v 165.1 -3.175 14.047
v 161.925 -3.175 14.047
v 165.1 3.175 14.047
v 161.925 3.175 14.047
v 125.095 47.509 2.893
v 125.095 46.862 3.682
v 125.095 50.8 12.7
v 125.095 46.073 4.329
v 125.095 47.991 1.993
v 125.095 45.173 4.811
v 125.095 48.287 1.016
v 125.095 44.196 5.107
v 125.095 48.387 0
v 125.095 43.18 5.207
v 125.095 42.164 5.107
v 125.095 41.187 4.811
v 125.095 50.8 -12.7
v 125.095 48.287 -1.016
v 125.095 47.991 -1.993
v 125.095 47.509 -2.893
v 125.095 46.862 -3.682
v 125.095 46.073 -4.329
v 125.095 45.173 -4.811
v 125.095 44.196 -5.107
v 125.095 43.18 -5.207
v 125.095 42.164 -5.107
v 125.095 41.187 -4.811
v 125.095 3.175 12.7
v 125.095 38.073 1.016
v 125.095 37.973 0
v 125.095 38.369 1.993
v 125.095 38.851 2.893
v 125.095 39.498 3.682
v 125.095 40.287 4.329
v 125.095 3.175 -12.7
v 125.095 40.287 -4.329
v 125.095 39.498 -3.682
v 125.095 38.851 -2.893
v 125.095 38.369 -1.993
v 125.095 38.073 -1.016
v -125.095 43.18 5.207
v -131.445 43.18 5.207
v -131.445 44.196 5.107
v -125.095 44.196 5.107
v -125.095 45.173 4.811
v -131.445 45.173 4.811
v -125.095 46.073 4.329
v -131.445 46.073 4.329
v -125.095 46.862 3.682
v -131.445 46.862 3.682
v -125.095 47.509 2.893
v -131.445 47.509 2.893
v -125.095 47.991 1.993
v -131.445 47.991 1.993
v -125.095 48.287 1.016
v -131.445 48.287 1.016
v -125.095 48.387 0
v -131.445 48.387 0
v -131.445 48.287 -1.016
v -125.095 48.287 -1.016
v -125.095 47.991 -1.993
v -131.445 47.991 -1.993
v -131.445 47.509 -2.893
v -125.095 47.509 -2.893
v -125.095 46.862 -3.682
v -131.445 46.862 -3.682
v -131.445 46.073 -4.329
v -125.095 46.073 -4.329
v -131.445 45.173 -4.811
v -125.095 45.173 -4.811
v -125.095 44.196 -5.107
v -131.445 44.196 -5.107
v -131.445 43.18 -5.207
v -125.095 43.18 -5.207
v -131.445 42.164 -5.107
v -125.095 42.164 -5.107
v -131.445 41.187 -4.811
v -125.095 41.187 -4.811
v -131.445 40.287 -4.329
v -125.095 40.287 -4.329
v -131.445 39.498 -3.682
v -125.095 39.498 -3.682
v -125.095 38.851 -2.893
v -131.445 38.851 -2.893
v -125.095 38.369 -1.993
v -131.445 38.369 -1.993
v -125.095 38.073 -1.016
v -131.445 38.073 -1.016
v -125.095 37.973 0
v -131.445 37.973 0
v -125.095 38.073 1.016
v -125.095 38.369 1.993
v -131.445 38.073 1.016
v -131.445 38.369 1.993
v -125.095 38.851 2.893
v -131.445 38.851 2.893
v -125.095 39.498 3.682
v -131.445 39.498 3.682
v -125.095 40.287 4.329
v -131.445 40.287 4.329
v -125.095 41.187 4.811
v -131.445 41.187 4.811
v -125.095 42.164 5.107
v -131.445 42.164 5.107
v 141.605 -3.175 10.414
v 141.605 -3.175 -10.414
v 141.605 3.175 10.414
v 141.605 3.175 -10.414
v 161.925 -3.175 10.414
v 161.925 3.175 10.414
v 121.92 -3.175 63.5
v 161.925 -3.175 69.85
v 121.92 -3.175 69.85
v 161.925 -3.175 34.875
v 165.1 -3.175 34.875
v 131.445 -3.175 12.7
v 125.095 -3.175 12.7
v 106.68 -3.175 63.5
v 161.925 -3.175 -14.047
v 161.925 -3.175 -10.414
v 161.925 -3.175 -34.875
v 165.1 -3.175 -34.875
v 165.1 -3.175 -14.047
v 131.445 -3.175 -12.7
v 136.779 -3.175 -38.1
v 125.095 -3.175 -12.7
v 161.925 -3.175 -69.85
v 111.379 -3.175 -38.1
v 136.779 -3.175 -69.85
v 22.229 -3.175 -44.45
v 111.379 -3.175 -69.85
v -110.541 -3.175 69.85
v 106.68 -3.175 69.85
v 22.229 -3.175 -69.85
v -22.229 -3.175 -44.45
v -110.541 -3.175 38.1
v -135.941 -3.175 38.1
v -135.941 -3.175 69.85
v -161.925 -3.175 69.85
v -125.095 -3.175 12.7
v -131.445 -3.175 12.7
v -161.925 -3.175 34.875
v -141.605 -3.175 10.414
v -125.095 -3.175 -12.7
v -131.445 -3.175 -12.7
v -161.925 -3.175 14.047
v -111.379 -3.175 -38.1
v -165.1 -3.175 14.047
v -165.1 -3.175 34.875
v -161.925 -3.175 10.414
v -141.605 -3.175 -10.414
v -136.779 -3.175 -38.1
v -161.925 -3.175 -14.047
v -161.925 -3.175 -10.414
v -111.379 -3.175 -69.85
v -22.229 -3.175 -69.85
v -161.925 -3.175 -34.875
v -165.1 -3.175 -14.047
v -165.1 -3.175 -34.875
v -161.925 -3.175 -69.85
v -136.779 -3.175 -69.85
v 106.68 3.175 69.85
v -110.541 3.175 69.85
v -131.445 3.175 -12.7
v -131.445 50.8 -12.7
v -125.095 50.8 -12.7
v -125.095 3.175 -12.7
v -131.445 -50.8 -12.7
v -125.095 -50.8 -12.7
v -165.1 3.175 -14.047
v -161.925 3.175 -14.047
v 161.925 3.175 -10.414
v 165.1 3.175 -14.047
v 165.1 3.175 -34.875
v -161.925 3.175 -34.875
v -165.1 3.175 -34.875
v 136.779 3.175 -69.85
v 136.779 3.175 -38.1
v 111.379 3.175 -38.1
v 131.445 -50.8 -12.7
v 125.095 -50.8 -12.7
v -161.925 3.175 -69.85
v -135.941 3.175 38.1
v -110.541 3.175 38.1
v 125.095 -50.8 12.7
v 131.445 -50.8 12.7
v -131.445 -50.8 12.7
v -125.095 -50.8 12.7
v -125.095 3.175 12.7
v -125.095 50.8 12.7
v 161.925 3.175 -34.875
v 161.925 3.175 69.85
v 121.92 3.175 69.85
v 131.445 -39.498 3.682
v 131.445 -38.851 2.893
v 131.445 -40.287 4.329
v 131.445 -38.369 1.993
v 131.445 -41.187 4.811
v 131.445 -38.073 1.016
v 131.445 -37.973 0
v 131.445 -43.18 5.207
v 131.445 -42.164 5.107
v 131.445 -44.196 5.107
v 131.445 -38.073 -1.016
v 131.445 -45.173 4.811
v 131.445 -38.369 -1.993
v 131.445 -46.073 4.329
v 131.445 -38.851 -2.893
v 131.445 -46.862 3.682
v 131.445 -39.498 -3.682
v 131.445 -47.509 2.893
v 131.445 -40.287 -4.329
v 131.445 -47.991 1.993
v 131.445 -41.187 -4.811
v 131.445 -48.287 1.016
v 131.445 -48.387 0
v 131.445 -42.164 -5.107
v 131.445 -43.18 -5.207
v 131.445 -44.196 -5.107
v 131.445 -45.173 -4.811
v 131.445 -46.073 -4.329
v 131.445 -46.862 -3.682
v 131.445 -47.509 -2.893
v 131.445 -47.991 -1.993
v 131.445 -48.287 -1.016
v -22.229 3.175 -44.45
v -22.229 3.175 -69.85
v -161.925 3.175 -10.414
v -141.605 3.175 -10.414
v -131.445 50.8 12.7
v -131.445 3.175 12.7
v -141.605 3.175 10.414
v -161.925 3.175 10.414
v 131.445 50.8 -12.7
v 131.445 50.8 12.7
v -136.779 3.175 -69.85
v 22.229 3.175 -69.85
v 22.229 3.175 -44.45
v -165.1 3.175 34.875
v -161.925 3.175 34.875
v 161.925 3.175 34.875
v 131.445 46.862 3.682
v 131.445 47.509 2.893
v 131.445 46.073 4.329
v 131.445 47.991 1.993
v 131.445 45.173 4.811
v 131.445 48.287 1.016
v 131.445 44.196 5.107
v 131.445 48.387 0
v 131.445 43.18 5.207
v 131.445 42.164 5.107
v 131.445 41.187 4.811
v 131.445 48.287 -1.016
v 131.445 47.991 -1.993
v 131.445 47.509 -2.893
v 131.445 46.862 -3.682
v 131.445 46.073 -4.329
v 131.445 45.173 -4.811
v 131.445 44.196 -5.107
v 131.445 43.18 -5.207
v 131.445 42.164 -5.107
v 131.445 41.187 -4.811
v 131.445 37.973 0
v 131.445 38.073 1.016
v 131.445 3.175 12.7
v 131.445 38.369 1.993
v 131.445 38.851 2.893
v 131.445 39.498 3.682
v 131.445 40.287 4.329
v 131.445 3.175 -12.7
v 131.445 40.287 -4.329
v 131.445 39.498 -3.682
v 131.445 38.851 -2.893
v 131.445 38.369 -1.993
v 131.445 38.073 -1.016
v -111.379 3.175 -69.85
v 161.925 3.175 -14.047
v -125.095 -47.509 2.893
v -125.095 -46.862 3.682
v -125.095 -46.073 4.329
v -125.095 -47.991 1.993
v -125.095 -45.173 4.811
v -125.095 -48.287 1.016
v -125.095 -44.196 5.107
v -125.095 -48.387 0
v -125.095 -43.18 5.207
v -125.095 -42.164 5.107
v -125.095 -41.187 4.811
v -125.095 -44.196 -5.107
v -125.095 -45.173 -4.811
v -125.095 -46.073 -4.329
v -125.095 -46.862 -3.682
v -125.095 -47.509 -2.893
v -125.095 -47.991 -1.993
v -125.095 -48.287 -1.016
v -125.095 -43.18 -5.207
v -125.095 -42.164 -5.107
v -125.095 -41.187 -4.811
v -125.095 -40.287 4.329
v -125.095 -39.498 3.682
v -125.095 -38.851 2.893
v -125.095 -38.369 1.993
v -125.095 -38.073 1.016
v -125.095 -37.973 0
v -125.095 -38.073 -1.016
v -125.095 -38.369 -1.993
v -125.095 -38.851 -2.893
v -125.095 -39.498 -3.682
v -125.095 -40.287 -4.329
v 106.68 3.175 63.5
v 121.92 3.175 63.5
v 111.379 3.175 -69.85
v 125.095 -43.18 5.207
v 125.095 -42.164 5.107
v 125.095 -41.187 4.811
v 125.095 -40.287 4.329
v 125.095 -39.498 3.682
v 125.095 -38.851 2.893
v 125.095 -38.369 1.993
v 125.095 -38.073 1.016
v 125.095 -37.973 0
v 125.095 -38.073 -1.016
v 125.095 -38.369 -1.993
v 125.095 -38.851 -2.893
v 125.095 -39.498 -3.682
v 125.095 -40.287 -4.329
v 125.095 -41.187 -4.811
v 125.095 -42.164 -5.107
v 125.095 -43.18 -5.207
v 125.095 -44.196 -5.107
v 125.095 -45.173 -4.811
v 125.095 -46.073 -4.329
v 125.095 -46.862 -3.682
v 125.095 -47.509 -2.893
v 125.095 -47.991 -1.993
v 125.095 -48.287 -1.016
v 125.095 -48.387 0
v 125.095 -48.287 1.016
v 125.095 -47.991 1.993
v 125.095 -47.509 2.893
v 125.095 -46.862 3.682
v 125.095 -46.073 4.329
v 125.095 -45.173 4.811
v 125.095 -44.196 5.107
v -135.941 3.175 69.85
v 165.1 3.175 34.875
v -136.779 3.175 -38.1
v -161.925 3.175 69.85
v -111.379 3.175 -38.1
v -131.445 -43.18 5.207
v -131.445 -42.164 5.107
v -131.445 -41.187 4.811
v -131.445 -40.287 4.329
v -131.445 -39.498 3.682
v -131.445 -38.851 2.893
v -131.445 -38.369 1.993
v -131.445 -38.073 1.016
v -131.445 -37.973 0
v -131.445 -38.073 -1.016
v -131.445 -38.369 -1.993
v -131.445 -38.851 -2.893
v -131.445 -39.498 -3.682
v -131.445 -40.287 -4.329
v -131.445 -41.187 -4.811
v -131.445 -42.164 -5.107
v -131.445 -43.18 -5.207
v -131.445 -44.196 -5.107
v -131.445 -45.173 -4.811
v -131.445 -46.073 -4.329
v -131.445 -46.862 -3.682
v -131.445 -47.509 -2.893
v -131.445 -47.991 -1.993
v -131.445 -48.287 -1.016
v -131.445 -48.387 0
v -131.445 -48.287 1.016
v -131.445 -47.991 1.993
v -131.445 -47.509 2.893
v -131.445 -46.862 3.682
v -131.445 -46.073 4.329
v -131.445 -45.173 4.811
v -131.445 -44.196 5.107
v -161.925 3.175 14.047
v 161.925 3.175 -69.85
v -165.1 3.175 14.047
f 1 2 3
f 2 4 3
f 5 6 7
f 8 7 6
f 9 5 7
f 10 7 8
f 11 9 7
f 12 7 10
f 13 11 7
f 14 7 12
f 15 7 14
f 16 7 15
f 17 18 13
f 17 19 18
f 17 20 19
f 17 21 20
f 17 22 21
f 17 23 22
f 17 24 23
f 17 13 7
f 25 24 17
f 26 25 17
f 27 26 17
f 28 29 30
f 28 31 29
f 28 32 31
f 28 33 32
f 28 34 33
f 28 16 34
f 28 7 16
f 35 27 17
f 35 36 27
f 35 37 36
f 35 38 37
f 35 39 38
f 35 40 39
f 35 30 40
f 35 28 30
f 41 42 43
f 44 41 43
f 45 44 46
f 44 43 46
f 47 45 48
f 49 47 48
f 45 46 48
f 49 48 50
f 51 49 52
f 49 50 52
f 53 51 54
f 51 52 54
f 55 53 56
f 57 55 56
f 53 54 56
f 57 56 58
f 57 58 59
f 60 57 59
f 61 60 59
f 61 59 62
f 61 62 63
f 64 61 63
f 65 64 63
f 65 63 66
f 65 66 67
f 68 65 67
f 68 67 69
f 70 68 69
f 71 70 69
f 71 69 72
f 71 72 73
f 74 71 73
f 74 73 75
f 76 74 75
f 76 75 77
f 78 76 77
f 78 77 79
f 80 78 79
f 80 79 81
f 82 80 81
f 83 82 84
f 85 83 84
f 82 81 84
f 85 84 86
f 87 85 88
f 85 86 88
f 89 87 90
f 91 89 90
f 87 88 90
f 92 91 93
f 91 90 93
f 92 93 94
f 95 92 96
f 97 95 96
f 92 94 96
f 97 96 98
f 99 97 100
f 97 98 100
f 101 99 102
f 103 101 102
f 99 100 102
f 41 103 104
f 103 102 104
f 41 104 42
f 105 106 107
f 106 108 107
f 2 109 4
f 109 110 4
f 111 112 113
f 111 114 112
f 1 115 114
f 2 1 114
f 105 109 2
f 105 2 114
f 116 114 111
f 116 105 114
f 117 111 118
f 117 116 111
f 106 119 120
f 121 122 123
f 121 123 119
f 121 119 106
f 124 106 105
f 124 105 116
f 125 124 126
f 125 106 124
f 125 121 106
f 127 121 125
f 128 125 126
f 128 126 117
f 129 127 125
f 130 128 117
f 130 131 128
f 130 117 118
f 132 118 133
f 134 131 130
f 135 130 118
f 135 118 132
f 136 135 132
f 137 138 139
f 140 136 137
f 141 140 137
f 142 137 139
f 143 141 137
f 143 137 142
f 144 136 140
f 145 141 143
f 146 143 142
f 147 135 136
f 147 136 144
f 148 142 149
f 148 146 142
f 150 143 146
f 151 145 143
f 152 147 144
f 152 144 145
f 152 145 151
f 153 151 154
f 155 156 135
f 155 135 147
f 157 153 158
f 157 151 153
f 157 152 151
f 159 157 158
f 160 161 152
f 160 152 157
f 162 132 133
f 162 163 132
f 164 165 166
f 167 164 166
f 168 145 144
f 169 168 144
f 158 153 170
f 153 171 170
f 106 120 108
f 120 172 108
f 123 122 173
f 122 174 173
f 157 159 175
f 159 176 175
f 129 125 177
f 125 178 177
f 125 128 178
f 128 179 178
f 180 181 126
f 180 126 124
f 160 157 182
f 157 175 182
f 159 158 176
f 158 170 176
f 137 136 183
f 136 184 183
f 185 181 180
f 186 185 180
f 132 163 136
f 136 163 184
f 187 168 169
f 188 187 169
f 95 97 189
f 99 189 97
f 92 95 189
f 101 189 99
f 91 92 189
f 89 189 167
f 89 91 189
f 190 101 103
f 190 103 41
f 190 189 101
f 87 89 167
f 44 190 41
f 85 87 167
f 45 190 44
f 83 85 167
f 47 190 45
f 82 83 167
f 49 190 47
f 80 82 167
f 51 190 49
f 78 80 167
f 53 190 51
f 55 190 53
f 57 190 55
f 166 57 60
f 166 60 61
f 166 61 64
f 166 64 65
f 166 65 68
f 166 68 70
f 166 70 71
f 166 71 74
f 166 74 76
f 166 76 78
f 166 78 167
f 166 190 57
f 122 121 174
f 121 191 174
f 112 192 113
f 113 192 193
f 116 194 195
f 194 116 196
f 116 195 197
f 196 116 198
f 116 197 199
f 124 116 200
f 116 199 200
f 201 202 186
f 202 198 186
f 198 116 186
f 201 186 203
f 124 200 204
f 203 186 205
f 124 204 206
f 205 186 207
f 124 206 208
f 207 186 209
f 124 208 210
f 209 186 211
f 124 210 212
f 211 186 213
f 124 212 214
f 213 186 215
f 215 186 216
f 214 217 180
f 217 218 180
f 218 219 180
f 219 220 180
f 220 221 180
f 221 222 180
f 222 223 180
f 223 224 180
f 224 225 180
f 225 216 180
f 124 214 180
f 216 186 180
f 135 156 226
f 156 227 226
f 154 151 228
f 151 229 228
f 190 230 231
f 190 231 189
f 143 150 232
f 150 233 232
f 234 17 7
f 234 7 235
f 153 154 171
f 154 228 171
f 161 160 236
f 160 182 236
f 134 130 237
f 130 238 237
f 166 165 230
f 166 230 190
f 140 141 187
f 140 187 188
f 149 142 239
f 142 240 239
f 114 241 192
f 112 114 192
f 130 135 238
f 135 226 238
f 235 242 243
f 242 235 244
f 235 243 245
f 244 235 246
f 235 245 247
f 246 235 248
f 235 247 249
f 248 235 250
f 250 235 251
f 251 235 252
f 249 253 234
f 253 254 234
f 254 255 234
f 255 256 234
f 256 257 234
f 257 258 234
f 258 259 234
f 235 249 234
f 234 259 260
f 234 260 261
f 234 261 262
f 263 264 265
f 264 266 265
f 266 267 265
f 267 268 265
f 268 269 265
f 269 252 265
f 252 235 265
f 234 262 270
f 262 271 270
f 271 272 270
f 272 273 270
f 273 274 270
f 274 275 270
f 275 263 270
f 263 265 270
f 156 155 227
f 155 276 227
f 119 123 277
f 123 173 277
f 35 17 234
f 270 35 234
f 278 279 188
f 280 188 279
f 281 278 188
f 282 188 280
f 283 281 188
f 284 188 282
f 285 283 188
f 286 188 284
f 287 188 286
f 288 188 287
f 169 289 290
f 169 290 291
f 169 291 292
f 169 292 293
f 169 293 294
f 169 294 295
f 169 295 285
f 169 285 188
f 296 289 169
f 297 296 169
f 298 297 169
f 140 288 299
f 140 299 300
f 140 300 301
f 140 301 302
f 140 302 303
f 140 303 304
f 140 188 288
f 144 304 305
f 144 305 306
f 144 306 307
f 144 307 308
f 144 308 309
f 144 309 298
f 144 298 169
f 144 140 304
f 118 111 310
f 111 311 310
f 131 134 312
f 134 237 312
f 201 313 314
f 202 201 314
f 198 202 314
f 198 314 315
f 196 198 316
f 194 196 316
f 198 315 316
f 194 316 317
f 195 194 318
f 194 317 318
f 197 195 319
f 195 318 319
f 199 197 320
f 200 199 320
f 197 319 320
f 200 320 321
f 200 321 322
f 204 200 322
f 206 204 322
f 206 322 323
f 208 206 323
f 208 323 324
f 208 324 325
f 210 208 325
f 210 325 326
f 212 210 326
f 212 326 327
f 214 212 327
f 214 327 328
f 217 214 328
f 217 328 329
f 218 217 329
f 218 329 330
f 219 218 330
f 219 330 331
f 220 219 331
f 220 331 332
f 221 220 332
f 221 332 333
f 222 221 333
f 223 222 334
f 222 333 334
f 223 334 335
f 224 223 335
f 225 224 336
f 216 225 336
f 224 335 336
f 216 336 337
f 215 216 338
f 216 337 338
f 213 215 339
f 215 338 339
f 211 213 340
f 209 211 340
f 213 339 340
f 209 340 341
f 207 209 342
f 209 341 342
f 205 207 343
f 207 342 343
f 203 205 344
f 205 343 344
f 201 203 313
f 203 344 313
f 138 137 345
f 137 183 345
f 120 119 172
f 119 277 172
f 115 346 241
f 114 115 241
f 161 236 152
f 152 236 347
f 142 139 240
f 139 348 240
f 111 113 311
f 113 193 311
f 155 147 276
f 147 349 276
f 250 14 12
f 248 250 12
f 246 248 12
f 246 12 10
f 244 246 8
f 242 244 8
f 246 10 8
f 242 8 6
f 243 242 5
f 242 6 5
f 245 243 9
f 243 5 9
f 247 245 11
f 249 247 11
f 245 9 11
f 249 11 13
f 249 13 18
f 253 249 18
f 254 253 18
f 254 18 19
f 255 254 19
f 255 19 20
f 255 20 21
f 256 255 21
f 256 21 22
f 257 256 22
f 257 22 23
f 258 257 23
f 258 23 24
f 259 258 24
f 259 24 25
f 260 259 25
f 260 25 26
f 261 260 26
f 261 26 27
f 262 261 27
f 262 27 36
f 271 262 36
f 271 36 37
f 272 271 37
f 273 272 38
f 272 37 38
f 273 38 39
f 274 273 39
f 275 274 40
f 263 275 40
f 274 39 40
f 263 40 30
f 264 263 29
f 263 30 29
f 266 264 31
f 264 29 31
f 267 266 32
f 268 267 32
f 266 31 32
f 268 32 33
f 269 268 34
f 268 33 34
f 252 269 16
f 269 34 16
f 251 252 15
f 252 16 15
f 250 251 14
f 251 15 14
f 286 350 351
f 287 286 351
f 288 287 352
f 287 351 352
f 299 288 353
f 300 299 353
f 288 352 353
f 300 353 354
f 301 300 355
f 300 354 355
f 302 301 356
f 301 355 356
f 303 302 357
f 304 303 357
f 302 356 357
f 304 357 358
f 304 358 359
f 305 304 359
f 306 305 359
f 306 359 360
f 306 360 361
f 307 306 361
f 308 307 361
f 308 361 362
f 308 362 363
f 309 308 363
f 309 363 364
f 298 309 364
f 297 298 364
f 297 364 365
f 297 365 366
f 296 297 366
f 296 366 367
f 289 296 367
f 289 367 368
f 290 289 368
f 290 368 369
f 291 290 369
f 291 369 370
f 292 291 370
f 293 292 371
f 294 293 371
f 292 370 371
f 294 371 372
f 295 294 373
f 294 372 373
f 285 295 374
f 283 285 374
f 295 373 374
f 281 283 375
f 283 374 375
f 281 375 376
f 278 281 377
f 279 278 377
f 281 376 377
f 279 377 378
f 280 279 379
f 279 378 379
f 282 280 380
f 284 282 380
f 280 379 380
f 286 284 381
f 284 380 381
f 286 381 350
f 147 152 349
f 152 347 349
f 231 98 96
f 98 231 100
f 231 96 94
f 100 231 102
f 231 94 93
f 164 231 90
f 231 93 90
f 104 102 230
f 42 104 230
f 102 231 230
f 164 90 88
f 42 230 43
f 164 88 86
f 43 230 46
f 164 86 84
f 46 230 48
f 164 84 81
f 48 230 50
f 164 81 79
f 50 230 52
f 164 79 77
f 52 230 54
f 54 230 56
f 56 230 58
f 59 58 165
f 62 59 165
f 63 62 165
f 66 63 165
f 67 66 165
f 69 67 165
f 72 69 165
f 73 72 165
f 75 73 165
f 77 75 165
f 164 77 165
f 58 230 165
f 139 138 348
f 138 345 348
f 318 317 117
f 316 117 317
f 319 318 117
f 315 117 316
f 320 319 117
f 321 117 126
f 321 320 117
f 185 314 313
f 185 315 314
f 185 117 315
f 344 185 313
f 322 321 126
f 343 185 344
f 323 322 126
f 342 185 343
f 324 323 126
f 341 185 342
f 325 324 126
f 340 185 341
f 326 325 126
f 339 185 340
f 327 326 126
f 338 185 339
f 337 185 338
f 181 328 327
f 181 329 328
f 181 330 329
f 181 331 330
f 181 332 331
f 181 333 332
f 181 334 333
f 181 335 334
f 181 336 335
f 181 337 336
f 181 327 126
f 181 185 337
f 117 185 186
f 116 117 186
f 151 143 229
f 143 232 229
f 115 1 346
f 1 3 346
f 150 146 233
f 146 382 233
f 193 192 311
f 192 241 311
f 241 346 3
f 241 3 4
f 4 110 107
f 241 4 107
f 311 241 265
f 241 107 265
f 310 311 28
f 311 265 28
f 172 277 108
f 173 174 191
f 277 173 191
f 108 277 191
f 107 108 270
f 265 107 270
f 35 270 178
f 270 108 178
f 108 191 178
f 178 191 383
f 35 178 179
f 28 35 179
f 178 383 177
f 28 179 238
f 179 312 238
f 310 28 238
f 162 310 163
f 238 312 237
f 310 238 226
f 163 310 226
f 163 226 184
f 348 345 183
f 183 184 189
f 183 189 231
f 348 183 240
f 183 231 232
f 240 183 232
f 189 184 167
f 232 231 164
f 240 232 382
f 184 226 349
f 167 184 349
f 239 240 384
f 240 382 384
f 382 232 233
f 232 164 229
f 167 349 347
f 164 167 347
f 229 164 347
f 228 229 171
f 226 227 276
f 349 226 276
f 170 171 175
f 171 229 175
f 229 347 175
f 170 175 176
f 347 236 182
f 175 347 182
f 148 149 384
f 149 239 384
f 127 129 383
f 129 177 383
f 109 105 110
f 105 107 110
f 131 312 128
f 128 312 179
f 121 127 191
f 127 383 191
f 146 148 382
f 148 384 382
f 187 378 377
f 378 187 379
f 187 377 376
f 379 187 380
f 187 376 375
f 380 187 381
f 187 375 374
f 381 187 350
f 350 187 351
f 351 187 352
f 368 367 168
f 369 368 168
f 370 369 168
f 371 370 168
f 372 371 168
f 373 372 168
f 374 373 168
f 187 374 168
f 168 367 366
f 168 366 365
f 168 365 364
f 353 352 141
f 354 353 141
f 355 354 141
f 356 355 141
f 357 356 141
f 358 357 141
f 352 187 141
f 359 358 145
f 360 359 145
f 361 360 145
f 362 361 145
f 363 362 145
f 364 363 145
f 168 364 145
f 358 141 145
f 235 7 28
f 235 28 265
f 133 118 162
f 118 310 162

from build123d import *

# Parameters (mm, degrees)
BOSS_EXTRUDE1_DEPTH     = 3.175
SKETCH2_W               = 6.35
SKETCH2_H               = 25.4
BOSS_EXTRUDE2_DEPTH     = 50.8
SKETCH3_R               = 5.207
CUT_EXTRUDE1_DEPTH      = 34.655
CUT_EXTRUDE1_DEPTH_BACK = 297.545


with BuildPart() as part:
    # Sketch1 → Boss-Extrude1 (new body, symmetric)
    with BuildSketch(Plane(origin=(0, 0, 0), x_dir=(1, 0, 0), z_dir=(0, 1, 0))):
        Polygon((161.925, -69.85), (121.92, -69.85), (121.92, -63.5), (106.68, -63.5), (106.68, -69.85), (-106.68, -69.85), (-110.5408, -69.85), (-110.5408, -38.1), (-135.9408, -38.1), (-135.9408, -69.85), (-161.925, -69.85), (-161.925, -34.874677354), (-165.1, -34.874677354), (-165.1, -14.046677354), (-161.925, -14.046677354), (-161.925, -10.414), (-141.605, -10.414), (-141.605, 10.414), (-161.925, 10.414), (-161.925, 14.046677354), (-165.1, 14.046677354), (-165.1, 34.874677354), (-161.925, 34.874677354), (-161.925, 69.85), (-136.779, 69.85), (-136.779, 38.1), (-111.379, 38.1), (-111.379, 69.85), (-22.228595254, 69.85), (-22.228595254, 44.45), (22.228595254, 44.45), (22.228595254, 69.85), (111.379, 69.85), (111.379, 38.1), (136.779, 38.1), (136.779, 69.85), (161.925, 69.85), (161.925, 34.874677354), (165.1, 34.874677354), (165.1, 14.046677354), (161.925, 14.046677354), (161.925, 10.414), (141.605, 10.414), (141.605, -10.414), (161.925, -10.414), (161.925, -14.046677354), (165.1, -14.046677354), (165.1, -34.874677354), (161.925, -34.874677354), align=None)
    extrude(amount=BOSS_EXTRUDE1_DEPTH, both=True)

    # Sketch2 → Boss-Extrude2 (add, symmetric)
    with BuildSketch(Plane(origin=(0, 0, 0), x_dir=(1, 0, 0), z_dir=(0, 1, 0))):
        with Locations((128.27, 0)):
            Rectangle(SKETCH2_W, SKETCH2_H)
        with Locations((-128.27, 0)):
            Rectangle(SKETCH2_W, SKETCH2_H)
    extrude(amount=BOSS_EXTRUDE2_DEPTH, both=True)

    # Sketch3 → Cut-Extrude1 (cut, two sides)
    with BuildSketch(Plane.ZY.offset(131.445)) as cut_extrude1_sk:
        with Locations((0, 43.18)):
            Circle(SKETCH3_R)
        with Locations((0, -43.18)):
            Circle(SKETCH3_R)
    extrude(amount=CUT_EXTRUDE1_DEPTH, mode=Mode.SUBTRACT)
    extrude(cut_extrude1_sk.sketch, amount=-CUT_EXTRUDE1_DEPTH_BACK, mode=Mode.SUBTRACT)


solid = part.part
